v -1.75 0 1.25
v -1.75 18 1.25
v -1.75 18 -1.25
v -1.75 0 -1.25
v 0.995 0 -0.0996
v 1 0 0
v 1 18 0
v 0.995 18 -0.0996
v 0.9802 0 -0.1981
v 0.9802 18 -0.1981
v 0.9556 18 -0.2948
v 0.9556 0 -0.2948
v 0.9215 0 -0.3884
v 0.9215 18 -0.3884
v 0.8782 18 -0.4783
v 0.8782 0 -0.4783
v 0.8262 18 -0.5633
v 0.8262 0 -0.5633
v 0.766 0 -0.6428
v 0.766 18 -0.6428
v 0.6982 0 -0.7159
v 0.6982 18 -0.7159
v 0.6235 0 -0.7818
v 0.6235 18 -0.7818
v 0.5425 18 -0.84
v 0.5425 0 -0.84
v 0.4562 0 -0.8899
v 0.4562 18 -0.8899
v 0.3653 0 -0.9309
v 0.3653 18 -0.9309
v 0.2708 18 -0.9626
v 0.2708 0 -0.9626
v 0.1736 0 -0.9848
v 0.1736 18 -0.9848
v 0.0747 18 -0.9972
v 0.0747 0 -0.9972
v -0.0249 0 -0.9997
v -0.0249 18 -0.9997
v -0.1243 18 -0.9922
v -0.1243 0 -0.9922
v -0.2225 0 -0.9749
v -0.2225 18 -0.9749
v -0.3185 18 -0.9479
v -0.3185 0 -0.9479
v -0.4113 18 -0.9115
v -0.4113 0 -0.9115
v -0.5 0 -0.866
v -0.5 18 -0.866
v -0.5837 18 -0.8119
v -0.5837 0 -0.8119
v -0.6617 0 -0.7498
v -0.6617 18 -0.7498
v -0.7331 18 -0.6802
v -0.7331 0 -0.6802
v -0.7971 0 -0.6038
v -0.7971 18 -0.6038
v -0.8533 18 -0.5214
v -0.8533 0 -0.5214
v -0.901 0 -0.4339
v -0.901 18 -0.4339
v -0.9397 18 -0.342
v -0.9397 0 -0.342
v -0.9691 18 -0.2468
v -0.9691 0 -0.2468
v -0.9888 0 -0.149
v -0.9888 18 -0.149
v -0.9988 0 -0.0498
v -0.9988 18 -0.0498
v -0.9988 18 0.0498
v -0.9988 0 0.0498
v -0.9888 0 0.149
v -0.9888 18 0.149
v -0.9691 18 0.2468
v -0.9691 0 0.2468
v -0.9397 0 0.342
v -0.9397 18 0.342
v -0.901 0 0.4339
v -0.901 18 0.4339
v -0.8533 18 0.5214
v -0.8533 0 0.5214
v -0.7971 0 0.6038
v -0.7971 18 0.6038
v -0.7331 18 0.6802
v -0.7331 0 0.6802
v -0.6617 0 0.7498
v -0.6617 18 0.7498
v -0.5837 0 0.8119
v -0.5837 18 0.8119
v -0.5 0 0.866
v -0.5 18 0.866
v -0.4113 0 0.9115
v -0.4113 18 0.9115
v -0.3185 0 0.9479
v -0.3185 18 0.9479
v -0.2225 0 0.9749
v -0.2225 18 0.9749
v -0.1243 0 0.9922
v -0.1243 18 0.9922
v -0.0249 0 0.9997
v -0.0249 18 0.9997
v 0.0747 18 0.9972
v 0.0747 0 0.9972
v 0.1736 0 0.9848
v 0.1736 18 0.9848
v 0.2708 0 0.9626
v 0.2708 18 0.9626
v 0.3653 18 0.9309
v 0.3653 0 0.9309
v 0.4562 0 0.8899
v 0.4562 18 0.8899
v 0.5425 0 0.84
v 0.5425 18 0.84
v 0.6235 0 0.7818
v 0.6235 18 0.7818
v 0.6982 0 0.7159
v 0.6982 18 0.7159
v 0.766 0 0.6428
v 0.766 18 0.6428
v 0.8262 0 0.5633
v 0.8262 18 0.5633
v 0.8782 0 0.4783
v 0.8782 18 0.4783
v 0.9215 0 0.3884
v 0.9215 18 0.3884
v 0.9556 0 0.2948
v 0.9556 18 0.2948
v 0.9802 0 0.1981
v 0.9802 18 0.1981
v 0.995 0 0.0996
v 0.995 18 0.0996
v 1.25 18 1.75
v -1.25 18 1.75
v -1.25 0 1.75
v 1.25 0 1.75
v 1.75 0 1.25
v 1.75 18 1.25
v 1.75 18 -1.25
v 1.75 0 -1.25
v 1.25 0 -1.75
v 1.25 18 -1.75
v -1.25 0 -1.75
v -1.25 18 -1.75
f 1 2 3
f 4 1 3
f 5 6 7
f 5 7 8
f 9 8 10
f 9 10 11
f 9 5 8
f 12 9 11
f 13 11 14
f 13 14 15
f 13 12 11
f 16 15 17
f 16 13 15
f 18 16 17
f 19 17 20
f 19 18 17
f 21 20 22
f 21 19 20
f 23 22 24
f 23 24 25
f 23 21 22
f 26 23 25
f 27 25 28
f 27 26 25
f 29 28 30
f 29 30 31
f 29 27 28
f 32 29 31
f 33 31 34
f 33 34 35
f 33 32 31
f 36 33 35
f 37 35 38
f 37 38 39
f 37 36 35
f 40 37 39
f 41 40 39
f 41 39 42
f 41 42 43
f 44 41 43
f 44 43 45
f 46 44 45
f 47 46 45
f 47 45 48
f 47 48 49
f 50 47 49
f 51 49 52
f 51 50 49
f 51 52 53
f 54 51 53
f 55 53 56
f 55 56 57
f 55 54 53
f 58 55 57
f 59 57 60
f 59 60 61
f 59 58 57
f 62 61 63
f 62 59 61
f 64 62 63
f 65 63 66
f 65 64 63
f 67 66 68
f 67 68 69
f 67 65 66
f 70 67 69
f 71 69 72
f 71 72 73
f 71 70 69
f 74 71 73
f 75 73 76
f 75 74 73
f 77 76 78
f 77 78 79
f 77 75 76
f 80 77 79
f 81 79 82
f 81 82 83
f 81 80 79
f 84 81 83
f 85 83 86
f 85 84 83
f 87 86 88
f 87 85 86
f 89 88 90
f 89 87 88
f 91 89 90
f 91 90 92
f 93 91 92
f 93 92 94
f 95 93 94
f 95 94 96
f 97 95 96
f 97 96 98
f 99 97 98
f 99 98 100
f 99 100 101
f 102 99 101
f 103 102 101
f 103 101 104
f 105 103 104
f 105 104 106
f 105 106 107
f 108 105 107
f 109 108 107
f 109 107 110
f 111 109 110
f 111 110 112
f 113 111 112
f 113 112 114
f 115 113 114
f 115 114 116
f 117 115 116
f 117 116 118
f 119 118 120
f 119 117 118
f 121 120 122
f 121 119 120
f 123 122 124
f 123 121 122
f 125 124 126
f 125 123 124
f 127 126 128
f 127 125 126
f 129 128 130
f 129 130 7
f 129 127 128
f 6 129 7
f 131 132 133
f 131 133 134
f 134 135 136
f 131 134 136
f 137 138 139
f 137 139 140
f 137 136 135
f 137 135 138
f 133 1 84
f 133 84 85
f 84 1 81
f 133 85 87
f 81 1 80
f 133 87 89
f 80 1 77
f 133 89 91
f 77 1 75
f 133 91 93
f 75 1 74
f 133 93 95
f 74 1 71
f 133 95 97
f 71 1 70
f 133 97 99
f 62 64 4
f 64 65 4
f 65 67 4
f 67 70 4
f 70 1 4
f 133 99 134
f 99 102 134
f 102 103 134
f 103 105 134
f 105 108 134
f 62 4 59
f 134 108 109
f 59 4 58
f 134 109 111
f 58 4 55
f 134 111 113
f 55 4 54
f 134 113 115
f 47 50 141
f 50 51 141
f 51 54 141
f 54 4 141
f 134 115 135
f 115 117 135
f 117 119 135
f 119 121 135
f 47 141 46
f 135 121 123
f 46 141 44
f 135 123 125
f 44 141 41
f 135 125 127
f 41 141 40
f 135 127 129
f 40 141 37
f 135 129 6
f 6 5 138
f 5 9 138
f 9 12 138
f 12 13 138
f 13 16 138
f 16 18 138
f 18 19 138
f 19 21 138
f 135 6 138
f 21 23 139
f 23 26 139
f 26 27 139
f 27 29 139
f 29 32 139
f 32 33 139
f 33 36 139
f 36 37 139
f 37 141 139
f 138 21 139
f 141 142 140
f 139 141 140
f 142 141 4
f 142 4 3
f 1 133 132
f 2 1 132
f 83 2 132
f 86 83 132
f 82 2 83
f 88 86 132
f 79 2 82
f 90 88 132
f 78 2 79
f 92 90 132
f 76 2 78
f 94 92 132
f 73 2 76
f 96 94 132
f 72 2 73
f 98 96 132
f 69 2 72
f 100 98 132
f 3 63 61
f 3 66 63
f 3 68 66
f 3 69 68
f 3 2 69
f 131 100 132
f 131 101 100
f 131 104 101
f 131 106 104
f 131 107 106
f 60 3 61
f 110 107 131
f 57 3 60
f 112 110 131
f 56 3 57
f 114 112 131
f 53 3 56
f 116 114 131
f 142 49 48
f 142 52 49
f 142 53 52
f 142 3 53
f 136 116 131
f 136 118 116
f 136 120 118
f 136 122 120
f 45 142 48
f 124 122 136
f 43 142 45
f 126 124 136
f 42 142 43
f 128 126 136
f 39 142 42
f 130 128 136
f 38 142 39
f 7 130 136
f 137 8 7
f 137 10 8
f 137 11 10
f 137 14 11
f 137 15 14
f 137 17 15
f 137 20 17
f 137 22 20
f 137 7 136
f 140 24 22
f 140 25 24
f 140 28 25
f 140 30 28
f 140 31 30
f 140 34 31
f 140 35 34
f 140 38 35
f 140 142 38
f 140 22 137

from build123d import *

# Parameters (mm, degrees)
SKETCH1_W           = 3.5
SKETCH1_H           = 3.5
SKETCH1_R           = 1
BOSS_EXTRUDE1_DEPTH = 18
CHAMFER1_SIZE       = 0.5


with BuildPart() as part:
    # Sketch1 → Boss-Extrude1 (new body)
    with BuildSketch(Plane(origin=(0, 0, 0), x_dir=(1, 0, 0), z_dir=(0, 1, 0))):
        Rectangle(SKETCH1_W, SKETCH1_H)
        Circle(SKETCH1_R, mode=Mode.SUBTRACT)
    extrude(amount=BOSS_EXTRUDE1_DEPTH)

    # Chamfer1
    chamfer1_edges = [part.edges().sort_by_distance(p)[0] for p in [
        (1.75, 9, 1.75),
        (-1.75, 9, 1.75),
        (-1.75, 9, -1.75),
        (1.75, 9, -1.75),
    ]]
    chamfer(chamfer1_edges, length=CHAMFER1_SIZE)


solid = part.part
